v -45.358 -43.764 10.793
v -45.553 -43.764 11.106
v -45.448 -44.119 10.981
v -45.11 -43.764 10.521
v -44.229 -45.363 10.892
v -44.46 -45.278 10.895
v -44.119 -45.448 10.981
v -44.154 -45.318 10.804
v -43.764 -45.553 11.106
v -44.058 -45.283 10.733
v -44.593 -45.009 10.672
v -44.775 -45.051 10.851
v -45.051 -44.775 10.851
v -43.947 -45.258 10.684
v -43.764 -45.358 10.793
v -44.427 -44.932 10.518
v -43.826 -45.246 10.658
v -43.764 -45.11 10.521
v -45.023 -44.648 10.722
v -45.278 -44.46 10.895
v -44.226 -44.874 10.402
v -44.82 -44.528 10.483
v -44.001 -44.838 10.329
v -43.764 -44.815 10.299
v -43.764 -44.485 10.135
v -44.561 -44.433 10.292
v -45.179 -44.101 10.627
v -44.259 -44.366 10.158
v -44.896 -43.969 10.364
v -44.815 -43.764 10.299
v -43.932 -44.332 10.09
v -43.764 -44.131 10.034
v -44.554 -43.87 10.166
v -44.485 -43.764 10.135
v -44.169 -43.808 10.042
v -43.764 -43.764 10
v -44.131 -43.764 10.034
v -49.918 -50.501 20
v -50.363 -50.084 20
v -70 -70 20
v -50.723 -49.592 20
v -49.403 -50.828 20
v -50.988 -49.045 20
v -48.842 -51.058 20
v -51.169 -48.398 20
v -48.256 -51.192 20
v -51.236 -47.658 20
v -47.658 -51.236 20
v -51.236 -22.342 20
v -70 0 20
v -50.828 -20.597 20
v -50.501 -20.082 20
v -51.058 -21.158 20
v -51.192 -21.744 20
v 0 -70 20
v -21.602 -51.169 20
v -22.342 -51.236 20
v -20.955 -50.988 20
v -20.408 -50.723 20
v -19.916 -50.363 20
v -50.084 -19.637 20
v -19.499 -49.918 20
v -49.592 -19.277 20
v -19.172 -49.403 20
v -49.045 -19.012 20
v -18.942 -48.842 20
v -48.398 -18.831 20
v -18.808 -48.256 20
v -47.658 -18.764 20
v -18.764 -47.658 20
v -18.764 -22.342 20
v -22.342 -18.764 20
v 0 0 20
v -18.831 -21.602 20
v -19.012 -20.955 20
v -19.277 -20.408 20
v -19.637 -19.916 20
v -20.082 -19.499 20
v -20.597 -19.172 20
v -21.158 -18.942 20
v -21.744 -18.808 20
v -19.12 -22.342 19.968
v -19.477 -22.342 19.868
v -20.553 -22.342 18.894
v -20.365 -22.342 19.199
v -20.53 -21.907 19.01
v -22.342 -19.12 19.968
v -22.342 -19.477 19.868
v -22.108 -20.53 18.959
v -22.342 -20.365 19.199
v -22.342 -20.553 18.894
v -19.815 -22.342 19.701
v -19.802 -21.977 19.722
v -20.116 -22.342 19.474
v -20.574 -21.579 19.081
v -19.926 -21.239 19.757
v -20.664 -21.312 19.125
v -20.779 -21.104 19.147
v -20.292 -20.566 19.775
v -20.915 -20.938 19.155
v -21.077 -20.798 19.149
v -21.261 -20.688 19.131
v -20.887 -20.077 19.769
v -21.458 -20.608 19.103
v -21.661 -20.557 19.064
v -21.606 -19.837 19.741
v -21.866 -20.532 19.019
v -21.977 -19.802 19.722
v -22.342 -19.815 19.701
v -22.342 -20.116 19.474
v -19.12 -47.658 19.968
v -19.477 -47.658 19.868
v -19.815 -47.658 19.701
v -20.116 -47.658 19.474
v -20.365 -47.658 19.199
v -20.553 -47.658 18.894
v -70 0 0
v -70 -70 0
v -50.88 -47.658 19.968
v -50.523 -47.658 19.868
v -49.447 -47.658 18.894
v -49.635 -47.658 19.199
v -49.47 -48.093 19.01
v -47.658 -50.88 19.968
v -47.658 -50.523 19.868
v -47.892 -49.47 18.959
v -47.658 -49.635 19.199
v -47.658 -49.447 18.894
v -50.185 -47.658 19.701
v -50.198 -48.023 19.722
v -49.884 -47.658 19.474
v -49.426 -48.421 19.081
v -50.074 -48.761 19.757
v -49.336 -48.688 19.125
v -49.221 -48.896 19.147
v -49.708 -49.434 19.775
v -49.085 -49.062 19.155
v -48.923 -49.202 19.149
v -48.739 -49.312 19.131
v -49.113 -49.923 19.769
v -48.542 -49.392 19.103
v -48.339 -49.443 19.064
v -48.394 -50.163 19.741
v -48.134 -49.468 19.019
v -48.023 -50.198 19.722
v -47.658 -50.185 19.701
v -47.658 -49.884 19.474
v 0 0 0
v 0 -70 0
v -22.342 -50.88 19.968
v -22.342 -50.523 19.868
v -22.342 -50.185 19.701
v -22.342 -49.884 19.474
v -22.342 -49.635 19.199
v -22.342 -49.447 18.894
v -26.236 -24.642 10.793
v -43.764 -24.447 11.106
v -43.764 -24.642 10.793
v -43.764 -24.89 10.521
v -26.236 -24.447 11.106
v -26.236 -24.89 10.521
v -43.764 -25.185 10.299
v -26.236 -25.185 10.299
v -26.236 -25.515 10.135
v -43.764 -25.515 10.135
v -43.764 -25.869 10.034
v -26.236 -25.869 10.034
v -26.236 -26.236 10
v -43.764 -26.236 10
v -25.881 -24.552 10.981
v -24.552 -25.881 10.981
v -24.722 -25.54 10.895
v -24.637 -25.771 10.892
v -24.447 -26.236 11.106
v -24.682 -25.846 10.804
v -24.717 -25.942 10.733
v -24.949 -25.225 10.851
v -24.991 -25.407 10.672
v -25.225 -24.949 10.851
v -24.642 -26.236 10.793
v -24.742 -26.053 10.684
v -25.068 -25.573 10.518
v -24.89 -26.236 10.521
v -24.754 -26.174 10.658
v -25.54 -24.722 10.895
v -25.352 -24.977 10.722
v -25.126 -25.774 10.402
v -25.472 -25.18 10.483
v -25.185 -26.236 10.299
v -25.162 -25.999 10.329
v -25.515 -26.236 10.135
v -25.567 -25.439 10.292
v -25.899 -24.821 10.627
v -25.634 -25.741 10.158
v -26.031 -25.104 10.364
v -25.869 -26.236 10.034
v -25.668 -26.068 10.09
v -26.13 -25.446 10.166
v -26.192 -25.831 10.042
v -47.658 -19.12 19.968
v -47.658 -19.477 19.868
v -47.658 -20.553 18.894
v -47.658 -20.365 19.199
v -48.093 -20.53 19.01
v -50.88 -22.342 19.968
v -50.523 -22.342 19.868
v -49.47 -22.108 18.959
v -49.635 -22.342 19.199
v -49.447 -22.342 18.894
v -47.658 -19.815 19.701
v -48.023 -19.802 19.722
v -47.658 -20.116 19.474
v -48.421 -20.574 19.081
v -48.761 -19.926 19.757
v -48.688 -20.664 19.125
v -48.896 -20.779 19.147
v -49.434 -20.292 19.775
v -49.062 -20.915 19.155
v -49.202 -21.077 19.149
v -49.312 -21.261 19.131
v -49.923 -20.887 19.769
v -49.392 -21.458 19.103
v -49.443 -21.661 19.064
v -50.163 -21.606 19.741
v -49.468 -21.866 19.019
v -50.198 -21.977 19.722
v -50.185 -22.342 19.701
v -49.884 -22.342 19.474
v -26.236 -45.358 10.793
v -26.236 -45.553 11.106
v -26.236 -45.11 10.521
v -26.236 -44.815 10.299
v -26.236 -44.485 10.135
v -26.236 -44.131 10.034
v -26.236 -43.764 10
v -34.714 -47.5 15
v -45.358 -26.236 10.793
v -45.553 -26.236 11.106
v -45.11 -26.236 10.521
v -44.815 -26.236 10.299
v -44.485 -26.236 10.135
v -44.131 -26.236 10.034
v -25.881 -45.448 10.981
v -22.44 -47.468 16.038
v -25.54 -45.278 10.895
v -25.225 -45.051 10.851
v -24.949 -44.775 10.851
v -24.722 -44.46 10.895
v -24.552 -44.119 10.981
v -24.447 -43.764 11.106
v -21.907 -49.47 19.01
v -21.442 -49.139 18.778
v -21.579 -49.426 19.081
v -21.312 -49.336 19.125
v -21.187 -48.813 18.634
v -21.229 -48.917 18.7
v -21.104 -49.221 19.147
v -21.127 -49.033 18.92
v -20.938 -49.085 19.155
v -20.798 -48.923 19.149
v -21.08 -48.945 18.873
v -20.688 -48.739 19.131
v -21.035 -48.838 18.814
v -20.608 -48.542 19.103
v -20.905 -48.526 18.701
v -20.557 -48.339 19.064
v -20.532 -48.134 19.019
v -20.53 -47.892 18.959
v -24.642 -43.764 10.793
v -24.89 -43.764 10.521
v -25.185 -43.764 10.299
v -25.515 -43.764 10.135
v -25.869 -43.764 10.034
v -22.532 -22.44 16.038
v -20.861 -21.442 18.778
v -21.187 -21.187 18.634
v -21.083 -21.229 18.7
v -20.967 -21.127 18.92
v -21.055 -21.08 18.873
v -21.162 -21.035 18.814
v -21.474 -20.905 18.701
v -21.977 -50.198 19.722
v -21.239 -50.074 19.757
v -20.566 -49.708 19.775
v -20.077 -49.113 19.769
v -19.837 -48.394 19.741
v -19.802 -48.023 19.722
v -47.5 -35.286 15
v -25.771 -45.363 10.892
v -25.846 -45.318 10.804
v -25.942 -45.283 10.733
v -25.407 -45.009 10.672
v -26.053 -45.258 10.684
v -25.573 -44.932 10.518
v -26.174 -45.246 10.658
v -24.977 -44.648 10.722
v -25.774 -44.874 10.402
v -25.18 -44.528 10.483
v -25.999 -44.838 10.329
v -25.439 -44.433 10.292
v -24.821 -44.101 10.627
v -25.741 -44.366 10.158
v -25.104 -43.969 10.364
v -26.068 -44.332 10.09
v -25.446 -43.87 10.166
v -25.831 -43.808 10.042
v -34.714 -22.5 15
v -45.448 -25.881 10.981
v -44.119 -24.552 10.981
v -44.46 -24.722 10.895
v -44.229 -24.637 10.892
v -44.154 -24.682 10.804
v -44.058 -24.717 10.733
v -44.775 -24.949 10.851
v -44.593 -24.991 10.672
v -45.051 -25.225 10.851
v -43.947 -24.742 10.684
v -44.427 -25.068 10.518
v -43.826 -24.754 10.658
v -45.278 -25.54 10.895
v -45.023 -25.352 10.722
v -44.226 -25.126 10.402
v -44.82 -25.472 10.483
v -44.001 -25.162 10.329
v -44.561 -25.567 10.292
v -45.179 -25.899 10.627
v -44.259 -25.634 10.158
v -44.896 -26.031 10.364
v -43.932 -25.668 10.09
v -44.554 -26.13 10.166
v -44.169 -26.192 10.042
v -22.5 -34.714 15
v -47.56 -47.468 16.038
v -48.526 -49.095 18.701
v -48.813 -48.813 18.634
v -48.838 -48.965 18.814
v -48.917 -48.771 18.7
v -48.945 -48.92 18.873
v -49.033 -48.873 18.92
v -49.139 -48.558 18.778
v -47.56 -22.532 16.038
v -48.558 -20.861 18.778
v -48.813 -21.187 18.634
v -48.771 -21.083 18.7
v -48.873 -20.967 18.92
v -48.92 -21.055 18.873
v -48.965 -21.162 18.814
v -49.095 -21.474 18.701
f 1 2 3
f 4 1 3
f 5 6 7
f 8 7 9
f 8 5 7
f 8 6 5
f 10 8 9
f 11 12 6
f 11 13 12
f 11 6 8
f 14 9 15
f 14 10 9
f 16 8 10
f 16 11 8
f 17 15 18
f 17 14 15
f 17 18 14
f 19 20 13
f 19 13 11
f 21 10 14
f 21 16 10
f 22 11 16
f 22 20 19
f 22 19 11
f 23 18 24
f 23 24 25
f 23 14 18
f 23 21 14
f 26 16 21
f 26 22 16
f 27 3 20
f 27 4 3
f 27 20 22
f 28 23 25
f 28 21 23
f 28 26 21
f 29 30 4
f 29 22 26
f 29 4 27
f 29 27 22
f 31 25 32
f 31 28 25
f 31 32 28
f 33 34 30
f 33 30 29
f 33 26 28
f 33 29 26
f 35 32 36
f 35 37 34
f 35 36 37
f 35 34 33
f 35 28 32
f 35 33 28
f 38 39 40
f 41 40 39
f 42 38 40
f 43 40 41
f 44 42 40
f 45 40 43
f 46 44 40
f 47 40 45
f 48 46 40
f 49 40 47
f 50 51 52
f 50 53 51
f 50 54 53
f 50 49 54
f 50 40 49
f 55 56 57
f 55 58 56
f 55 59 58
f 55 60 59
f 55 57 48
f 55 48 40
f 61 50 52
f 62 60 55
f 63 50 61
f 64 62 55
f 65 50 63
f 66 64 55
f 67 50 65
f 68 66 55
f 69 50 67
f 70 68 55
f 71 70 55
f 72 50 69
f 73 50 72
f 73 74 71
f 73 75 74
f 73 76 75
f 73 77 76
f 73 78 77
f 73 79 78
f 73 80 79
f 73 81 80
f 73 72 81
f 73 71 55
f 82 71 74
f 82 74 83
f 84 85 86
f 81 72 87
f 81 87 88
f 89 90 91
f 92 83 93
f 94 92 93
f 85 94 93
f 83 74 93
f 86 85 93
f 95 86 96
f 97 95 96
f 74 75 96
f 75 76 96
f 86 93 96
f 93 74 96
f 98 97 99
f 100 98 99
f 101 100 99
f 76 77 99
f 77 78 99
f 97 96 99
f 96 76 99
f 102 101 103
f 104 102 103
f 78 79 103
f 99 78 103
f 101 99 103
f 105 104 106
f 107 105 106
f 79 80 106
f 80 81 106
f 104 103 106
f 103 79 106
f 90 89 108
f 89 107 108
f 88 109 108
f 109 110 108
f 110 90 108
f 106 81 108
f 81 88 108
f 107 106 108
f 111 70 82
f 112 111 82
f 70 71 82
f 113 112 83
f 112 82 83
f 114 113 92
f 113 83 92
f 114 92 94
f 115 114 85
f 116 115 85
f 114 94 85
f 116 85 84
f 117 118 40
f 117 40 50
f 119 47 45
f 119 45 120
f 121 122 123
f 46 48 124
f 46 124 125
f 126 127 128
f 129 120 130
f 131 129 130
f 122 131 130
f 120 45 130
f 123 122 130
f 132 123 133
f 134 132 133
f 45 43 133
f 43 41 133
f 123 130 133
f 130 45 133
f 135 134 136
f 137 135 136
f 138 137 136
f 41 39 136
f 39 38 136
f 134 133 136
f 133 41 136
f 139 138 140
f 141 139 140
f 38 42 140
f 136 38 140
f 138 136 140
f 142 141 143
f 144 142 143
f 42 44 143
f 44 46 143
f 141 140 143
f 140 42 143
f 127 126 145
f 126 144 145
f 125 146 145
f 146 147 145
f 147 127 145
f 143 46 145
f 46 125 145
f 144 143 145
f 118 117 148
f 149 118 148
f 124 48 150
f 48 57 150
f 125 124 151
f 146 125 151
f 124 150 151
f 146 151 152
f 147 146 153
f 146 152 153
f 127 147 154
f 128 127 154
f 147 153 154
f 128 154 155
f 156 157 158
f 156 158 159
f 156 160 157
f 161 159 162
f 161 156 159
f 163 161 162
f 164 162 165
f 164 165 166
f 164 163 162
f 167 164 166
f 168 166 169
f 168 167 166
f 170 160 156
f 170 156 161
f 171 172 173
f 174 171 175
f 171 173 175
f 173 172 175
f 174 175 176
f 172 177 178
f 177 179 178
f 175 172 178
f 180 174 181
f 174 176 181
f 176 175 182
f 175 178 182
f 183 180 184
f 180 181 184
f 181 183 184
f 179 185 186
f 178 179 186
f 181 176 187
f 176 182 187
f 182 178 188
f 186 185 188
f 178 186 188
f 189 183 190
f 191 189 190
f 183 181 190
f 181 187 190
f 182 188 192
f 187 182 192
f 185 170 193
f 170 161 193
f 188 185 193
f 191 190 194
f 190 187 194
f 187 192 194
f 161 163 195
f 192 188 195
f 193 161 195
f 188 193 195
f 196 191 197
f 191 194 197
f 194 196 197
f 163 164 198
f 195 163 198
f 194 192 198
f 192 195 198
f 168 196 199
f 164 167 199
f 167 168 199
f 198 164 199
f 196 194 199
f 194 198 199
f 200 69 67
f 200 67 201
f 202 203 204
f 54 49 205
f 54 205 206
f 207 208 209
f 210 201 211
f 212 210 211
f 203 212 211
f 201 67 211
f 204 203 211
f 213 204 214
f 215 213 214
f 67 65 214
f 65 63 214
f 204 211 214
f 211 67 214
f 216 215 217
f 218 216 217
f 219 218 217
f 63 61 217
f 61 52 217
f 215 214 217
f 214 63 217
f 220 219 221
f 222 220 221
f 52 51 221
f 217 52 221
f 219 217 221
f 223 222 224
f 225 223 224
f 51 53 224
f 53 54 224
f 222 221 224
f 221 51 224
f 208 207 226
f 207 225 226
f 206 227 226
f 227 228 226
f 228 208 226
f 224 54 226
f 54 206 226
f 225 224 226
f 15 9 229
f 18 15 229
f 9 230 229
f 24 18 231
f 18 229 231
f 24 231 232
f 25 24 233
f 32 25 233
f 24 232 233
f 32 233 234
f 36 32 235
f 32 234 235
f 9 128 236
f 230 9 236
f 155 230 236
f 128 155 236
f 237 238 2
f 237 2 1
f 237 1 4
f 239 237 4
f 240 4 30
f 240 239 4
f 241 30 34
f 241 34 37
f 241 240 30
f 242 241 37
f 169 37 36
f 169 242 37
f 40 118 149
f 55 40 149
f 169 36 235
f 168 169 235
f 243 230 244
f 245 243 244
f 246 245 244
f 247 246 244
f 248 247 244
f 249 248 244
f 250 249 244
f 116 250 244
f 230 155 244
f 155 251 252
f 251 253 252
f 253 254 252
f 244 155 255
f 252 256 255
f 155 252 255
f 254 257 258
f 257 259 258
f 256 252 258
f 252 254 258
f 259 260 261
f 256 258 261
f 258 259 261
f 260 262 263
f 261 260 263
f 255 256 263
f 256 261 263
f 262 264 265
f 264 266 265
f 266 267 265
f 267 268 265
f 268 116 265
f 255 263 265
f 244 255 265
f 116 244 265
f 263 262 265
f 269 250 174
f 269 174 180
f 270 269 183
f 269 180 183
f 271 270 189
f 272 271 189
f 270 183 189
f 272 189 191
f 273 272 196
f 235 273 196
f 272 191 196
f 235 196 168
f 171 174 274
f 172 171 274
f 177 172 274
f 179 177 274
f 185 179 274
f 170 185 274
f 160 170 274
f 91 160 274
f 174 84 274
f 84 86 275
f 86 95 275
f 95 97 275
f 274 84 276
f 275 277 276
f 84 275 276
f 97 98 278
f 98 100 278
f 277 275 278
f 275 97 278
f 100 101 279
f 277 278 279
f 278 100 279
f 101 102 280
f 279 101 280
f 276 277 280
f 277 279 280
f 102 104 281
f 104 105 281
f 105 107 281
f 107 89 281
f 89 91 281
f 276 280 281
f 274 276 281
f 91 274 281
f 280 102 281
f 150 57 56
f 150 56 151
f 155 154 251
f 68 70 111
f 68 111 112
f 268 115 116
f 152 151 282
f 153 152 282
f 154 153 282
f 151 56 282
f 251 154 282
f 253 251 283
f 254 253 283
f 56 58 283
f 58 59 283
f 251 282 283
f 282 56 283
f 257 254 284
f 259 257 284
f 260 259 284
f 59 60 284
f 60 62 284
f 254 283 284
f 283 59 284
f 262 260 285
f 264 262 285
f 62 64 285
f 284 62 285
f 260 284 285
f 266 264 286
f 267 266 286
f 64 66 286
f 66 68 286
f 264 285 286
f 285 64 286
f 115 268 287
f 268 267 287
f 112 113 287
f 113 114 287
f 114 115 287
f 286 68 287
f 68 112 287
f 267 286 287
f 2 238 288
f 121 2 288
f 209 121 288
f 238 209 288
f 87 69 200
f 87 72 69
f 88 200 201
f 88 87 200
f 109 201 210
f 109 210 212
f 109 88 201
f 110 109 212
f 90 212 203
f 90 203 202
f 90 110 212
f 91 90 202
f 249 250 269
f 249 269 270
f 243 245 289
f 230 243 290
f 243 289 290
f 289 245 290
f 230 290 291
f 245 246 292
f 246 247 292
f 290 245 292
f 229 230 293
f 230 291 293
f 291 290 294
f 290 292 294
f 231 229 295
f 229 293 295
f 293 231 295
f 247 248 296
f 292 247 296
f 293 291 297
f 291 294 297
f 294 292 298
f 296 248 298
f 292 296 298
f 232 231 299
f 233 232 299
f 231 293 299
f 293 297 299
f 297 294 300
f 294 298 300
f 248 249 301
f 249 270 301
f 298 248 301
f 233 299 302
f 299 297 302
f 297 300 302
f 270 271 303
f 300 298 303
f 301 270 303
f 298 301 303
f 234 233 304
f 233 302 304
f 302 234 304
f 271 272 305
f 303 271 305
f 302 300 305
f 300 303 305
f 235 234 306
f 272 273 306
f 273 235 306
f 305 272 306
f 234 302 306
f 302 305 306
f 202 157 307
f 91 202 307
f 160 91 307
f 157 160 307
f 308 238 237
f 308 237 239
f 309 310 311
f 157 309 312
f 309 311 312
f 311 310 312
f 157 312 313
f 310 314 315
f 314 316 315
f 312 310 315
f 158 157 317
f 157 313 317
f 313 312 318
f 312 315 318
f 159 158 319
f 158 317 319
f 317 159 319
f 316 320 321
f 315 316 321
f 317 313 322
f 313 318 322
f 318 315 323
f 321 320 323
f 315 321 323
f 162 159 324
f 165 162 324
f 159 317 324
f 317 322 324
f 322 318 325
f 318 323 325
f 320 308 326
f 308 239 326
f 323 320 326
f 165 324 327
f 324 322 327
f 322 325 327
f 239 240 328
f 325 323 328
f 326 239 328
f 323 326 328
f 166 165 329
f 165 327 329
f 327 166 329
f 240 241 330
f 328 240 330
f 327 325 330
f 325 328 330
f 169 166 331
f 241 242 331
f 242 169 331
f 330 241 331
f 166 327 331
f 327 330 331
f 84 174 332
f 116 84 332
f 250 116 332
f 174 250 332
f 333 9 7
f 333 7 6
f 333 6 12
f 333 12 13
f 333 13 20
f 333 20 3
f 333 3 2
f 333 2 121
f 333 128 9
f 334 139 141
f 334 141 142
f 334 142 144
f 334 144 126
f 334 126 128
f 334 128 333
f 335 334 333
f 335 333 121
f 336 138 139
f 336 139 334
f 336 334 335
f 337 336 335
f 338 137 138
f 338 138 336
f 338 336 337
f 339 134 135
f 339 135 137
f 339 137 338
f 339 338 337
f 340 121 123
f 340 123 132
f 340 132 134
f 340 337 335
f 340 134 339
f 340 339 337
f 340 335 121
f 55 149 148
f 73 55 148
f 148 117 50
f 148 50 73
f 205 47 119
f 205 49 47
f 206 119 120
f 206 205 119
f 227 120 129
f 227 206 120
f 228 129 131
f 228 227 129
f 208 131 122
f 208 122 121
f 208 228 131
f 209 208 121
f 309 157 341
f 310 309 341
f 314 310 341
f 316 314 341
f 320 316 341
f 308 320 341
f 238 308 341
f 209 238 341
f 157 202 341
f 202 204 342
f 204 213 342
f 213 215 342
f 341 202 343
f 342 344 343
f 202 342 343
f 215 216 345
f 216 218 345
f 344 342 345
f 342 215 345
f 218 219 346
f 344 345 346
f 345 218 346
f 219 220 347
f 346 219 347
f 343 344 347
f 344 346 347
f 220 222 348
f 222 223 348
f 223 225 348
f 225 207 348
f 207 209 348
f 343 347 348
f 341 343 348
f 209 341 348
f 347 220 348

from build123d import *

# Parameters (mm, degrees)
SKETCH_W    = 70
SKETCH_H    = 70
PAD_DEPTH   = 20
SKETCH002_W = 20
SKETCH002_H = 20
SKETCH001_W = 30
SKETCH001_H = 30
FILLET_R    = 2


with BuildPart() as part:
    # Sketch → Pad (new body)
    with BuildSketch(Plane.XY):
        with Locations((-35, -35)):
            Rectangle(SKETCH_W, SKETCH_H)
    extrude(amount=PAD_DEPTH)

    # Sketch002 (on DatumPlane) → SubtractiveLoft section 0
    with BuildSketch(Plane.XY.offset(10)):
        with Locations((-35, -35)):
            Rectangle(SKETCH002_W, SKETCH002_H)
    # Sketch001 (on Face6 of Pad) → SubtractiveLoft section 1
    with BuildSketch(Plane.XY.offset(20)):
        with Locations((-35, -35)):
            Rectangle(SKETCH001_W, SKETCH001_H)
    loft(mode=Mode.SUBTRACT)

    # Fillet
    fillet_edges = [part.edges().sort_by_distance(p)[0] for p in [
        (-45, -35, 10),
        (-47.5, -47.5, 15),
        (-50, -35, 20),
        (-47.5, -22.5, 15),
        (-35, -25, 10),
        (-35, -20, 20),
        (-22.5, -22.5, 15),
        (-25, -35, 10),
        (-20, -35, 20),
        (-22.5, -47.5, 15),
        (-35, -45, 10),
        (-35, -50, 20),
    ]]
    fillet(fillet_edges, radius=FILLET_R)


solid = part.part
